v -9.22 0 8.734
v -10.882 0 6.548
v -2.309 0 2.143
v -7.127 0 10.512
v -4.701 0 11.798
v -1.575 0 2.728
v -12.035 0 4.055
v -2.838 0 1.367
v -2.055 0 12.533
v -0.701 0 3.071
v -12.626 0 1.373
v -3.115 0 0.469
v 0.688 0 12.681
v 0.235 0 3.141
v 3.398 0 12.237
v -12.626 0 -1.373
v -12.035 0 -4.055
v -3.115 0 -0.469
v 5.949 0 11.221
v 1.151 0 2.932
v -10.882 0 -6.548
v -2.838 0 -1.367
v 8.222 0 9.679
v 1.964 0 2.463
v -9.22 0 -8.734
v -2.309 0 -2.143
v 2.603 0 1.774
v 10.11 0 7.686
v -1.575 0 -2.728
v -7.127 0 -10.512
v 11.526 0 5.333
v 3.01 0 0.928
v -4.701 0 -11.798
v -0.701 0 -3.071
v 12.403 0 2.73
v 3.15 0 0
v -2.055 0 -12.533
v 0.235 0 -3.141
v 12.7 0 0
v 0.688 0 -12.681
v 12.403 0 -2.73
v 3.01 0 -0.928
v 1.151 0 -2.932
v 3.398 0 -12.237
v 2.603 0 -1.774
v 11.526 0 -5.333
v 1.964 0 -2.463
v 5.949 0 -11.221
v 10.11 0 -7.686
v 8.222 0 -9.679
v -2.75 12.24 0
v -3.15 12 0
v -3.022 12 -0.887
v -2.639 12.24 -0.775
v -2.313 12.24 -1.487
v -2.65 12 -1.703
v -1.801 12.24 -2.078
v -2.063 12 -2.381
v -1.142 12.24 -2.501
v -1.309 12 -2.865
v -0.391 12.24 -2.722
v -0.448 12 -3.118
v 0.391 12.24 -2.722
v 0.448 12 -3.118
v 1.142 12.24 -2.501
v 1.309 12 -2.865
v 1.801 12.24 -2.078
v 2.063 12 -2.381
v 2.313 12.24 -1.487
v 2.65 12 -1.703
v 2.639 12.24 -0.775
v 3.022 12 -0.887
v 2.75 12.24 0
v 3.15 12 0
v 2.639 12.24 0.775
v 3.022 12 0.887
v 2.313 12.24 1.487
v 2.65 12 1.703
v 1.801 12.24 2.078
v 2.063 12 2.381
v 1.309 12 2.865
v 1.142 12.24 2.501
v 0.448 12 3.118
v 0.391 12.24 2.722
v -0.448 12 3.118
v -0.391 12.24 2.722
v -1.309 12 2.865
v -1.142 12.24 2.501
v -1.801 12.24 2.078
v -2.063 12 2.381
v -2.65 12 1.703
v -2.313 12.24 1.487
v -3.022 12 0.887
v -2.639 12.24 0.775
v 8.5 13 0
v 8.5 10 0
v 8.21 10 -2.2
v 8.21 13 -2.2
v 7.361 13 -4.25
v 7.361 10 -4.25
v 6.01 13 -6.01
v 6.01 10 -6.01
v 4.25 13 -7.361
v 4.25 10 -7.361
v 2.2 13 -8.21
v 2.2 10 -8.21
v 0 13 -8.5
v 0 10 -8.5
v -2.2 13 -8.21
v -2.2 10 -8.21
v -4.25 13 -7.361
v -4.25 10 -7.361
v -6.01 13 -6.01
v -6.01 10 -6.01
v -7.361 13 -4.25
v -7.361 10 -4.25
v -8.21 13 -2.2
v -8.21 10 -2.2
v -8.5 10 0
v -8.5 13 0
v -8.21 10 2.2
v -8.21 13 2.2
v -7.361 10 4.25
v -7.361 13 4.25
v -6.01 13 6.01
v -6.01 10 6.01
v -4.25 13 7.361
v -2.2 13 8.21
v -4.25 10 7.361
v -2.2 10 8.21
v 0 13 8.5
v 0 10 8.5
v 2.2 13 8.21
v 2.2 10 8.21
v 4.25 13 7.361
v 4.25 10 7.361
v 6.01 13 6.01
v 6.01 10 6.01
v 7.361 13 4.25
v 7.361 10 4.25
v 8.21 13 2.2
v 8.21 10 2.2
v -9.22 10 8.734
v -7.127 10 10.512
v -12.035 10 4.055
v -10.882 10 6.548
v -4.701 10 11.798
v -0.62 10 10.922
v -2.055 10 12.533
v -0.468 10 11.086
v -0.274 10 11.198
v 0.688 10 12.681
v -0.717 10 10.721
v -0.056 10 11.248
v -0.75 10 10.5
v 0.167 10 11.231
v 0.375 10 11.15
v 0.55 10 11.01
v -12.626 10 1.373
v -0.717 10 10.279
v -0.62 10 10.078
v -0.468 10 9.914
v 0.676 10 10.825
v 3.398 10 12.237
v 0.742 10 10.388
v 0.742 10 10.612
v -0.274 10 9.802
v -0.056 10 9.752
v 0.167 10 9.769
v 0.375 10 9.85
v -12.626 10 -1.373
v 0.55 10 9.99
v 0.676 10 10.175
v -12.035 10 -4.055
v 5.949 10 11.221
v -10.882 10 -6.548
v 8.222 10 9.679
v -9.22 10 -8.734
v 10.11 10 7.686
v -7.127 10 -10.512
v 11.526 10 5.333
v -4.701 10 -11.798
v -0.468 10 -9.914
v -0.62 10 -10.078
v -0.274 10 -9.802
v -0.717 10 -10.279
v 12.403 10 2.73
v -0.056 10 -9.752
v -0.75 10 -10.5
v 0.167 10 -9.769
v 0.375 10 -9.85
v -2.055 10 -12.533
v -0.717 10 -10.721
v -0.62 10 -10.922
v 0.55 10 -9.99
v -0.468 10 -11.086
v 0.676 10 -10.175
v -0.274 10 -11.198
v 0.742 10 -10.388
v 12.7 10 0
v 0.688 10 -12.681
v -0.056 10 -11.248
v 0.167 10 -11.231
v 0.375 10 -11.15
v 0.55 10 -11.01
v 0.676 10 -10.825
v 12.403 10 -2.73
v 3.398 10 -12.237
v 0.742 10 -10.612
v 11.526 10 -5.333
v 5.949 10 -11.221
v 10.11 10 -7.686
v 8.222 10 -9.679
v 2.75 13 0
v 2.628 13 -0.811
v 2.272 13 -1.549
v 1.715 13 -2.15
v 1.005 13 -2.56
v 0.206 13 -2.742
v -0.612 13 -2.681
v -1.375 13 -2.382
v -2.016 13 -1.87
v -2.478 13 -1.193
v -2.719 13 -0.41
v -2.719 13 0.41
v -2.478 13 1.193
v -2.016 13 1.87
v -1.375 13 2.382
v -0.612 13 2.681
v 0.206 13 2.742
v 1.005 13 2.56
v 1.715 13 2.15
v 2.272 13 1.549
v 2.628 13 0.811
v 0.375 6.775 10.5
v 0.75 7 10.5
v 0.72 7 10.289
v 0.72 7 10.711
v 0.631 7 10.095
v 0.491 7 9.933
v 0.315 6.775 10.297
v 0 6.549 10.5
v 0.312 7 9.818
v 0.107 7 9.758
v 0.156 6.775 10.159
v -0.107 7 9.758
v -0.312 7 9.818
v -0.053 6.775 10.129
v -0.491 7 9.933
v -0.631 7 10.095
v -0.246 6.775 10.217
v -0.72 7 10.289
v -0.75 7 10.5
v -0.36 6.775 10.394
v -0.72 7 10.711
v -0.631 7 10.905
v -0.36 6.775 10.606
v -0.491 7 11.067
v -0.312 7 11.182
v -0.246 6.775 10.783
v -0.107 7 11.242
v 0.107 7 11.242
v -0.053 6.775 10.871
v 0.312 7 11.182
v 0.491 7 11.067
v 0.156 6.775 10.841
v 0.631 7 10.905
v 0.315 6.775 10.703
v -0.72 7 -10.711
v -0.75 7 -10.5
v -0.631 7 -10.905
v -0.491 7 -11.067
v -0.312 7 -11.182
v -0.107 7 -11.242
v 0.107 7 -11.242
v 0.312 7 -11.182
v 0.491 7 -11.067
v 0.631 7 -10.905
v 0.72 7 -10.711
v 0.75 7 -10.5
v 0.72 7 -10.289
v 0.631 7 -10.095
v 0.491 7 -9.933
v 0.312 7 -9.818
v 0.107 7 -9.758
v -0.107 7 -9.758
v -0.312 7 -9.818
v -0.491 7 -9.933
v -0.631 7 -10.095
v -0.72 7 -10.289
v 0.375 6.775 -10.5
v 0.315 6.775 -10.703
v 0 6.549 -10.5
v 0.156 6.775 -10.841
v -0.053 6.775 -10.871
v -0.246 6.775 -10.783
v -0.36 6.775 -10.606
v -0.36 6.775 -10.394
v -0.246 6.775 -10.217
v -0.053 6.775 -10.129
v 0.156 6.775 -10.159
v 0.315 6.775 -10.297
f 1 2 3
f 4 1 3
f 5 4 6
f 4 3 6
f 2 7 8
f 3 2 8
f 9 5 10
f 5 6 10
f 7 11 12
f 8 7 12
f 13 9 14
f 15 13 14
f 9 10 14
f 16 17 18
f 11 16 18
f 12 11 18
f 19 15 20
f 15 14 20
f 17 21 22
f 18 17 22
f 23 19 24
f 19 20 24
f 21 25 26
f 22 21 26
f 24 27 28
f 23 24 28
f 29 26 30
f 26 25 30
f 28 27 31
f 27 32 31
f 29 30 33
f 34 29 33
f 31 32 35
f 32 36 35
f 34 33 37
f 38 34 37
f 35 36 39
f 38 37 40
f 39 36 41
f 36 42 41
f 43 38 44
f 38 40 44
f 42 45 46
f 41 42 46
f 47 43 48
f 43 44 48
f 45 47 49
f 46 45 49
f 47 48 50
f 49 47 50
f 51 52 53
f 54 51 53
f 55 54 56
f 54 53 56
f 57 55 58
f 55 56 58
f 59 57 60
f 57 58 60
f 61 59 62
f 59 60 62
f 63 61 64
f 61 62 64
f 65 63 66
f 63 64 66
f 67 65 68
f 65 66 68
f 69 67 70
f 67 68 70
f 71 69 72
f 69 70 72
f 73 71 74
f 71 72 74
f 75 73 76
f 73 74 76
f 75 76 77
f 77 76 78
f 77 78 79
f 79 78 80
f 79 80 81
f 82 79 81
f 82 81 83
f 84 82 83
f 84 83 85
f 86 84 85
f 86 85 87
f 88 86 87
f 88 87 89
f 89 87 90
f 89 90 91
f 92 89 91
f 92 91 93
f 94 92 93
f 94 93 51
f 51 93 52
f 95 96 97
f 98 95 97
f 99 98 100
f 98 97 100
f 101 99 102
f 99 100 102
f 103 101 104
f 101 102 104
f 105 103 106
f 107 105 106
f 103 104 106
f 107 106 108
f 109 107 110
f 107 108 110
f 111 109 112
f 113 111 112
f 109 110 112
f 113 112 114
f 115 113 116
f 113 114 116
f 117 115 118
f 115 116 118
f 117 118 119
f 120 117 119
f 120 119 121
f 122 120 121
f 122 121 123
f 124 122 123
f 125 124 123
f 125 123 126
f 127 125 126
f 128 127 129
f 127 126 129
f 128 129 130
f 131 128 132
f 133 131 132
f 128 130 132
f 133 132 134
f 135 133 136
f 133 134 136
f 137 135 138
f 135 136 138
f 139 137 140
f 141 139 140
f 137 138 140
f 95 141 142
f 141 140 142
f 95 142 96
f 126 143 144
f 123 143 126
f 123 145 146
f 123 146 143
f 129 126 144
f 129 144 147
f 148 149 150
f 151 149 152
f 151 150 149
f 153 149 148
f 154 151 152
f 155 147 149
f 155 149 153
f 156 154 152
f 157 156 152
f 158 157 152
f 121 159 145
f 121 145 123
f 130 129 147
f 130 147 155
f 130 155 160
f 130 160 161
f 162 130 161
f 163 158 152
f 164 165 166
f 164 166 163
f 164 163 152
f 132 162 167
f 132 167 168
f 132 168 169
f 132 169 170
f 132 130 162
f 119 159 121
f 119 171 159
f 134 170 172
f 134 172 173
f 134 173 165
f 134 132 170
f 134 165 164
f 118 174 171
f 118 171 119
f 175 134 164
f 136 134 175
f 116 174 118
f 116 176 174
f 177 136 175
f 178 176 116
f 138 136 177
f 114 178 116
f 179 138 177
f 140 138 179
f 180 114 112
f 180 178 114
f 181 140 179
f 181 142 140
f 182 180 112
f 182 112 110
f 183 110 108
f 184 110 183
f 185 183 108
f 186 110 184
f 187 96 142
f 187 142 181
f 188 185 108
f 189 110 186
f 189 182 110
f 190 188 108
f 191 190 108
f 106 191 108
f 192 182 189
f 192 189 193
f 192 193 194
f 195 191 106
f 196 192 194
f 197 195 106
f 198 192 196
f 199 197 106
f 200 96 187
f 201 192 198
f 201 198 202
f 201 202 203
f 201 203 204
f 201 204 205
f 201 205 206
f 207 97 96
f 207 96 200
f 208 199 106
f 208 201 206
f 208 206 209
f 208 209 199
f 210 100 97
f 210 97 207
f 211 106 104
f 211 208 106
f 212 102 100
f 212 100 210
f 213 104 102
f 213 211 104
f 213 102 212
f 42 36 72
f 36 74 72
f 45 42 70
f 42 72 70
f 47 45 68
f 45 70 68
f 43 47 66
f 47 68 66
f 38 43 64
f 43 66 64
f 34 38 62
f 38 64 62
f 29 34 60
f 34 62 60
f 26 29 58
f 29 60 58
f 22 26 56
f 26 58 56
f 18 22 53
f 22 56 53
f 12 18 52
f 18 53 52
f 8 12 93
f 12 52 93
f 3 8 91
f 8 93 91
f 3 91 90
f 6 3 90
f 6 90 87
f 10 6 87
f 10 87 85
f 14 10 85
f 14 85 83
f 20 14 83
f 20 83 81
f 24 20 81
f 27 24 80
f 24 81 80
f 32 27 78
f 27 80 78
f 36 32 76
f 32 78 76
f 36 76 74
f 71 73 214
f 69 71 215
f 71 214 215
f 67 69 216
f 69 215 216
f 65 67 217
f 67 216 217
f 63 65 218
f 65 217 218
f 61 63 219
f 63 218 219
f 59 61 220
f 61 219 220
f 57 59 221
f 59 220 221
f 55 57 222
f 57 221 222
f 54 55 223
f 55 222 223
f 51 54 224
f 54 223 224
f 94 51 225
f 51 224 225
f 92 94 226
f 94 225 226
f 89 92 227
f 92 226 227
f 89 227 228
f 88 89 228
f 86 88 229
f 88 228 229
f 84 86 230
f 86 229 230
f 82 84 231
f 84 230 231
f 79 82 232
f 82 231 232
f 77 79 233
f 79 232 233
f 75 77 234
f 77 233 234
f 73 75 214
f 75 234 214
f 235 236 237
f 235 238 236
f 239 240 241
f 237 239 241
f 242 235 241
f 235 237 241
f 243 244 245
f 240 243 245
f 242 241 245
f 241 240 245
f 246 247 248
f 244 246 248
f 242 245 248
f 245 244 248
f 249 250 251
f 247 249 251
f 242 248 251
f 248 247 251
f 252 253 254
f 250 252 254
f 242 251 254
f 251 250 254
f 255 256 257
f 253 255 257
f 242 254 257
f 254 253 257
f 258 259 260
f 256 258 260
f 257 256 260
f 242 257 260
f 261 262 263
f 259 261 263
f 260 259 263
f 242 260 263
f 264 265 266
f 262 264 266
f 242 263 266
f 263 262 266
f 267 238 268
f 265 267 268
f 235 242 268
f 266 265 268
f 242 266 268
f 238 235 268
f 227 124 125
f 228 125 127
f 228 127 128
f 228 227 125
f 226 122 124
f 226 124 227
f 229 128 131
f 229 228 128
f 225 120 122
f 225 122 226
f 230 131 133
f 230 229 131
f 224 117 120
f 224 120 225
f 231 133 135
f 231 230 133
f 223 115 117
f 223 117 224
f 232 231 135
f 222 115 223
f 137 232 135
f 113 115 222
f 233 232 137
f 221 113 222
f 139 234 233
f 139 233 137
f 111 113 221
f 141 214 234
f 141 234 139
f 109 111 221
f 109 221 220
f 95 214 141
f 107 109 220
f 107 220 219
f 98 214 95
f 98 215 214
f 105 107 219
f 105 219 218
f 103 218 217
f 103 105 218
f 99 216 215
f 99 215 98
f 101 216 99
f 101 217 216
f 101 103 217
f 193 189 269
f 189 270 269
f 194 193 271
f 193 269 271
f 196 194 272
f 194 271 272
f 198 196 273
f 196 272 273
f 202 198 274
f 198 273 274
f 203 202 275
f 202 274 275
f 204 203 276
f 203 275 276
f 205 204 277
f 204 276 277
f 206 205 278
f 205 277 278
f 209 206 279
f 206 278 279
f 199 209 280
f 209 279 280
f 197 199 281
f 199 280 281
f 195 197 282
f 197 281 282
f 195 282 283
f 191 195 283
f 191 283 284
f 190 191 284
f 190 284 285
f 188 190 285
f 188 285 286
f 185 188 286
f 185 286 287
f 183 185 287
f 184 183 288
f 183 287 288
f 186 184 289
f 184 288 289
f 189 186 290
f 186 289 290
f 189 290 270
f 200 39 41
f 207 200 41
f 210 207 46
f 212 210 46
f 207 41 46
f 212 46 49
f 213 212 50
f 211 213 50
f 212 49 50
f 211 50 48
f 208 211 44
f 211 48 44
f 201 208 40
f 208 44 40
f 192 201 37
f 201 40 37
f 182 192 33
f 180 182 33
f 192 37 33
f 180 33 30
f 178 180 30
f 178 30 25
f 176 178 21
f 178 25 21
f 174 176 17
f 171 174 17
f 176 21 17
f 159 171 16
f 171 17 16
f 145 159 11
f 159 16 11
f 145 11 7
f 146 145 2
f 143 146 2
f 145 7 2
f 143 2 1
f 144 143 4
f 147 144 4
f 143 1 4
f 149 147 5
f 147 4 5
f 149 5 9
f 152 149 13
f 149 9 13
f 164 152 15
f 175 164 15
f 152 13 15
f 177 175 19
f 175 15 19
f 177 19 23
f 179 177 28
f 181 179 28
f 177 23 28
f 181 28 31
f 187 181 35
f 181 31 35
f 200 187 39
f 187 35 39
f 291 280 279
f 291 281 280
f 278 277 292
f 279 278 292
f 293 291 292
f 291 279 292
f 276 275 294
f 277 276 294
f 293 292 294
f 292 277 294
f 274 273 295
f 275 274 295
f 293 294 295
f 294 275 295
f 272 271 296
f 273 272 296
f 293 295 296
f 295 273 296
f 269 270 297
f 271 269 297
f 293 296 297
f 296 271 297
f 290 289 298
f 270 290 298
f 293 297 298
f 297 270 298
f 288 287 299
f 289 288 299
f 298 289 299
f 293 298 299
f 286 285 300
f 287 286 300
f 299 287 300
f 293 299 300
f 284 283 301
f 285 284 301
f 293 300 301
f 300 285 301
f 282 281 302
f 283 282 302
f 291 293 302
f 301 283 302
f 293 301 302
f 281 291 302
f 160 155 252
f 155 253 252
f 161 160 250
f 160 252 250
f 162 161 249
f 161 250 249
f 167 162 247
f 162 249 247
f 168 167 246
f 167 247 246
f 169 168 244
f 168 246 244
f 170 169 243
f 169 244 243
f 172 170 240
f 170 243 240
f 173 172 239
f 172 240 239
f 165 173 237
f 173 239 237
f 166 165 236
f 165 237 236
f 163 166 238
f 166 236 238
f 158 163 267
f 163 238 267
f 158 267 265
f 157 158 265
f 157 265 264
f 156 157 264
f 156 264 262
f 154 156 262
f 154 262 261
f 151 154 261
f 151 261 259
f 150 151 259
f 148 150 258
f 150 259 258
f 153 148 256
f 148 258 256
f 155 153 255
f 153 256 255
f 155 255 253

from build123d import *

# Parameters (mm, degrees)
SKETCH1_R                      = 12.7
BOSS_EXTRUDE1_DEPTH            = 10
SKETCH2_R                      = 8.5
BOSS_EXTRUDE2_DEPTH            = 3
F_5_5_5_5_DIAMETER_HOLE1_D     = 5.5
F_6_3_6_3_DIAMETER_HOLE1_D     = 6.3
F_6_3_6_3_DIAMETER_HOLE1_DEPTH = 12
F_6_3_6_3_DIAMETER_HOLE1_TIP   = 1.89271095
F_1_5MM_DOWEL_HOLE1_D          = 1.5
F_1_5MM_DOWEL_HOLE1_DEPTH      = 3
F_1_5MM_DOWEL_HOLE1_TIP        = 0.450645464


with BuildPart() as part:
    # Sketch1 → Boss-Extrude1 (new body)
    with BuildSketch(Plane(origin=(0, 0, 0), x_dir=(1, 0, 0), z_dir=(0, 1, 0))):
        Circle(SKETCH1_R)
    extrude(amount=BOSS_EXTRUDE1_DEPTH)

    # Sketch2 → Boss-Extrude2 (add)
    with BuildSketch(Plane(origin=(0, 10, 0), x_dir=(1, 0, 0), z_dir=(0, 1, 0))):
        Circle(SKETCH2_R)
    extrude(amount=BOSS_EXTRUDE2_DEPTH)

    # Ø5.5 (5.5) Diameter Hole1 (through all)
    with Locations(Plane(origin=(0, 0, 0), x_dir=(-1, 0, 0), z_dir=(0, -1, 0))):
        with Locations((0, 0)):
            Hole(F_5_5_5_5_DIAMETER_HOLE1_D / 2)

    # Ø6.3 (6.3) Diameter Hole1
    with Locations(Plane(origin=(0, 0, 0), x_dir=(-1, 0, 0), z_dir=(0, -1, 0))):
        with Locations((0, 0)):
            Hole(F_6_3_6_3_DIAMETER_HOLE1_D / 2, depth=F_6_3_6_3_DIAMETER_HOLE1_DEPTH)
            with Locations((0, 0, -(F_6_3_6_3_DIAMETER_HOLE1_DEPTH + F_6_3_6_3_DIAMETER_HOLE1_TIP / 2))):  # 118° drill point
                Cone(0, F_6_3_6_3_DIAMETER_HOLE1_D / 2, F_6_3_6_3_DIAMETER_HOLE1_TIP, mode=Mode.SUBTRACT)

    # Ø1.5mm Dowel Hole1
    with Locations(Plane(origin=(0, 10, 0), x_dir=(1, 0, 0), z_dir=(0, 1, 0))):
        with Locations((0, 10.5), (0, -10.5)):
            Hole(F_1_5MM_DOWEL_HOLE1_D / 2, depth=F_1_5MM_DOWEL_HOLE1_DEPTH)
            with Locations((0, 0, -(F_1_5MM_DOWEL_HOLE1_DEPTH + F_1_5MM_DOWEL_HOLE1_TIP / 2))):  # 118° drill point
                Cone(0, F_1_5MM_DOWEL_HOLE1_D / 2, F_1_5MM_DOWEL_HOLE1_TIP, mode=Mode.SUBTRACT)


solid = part.part
